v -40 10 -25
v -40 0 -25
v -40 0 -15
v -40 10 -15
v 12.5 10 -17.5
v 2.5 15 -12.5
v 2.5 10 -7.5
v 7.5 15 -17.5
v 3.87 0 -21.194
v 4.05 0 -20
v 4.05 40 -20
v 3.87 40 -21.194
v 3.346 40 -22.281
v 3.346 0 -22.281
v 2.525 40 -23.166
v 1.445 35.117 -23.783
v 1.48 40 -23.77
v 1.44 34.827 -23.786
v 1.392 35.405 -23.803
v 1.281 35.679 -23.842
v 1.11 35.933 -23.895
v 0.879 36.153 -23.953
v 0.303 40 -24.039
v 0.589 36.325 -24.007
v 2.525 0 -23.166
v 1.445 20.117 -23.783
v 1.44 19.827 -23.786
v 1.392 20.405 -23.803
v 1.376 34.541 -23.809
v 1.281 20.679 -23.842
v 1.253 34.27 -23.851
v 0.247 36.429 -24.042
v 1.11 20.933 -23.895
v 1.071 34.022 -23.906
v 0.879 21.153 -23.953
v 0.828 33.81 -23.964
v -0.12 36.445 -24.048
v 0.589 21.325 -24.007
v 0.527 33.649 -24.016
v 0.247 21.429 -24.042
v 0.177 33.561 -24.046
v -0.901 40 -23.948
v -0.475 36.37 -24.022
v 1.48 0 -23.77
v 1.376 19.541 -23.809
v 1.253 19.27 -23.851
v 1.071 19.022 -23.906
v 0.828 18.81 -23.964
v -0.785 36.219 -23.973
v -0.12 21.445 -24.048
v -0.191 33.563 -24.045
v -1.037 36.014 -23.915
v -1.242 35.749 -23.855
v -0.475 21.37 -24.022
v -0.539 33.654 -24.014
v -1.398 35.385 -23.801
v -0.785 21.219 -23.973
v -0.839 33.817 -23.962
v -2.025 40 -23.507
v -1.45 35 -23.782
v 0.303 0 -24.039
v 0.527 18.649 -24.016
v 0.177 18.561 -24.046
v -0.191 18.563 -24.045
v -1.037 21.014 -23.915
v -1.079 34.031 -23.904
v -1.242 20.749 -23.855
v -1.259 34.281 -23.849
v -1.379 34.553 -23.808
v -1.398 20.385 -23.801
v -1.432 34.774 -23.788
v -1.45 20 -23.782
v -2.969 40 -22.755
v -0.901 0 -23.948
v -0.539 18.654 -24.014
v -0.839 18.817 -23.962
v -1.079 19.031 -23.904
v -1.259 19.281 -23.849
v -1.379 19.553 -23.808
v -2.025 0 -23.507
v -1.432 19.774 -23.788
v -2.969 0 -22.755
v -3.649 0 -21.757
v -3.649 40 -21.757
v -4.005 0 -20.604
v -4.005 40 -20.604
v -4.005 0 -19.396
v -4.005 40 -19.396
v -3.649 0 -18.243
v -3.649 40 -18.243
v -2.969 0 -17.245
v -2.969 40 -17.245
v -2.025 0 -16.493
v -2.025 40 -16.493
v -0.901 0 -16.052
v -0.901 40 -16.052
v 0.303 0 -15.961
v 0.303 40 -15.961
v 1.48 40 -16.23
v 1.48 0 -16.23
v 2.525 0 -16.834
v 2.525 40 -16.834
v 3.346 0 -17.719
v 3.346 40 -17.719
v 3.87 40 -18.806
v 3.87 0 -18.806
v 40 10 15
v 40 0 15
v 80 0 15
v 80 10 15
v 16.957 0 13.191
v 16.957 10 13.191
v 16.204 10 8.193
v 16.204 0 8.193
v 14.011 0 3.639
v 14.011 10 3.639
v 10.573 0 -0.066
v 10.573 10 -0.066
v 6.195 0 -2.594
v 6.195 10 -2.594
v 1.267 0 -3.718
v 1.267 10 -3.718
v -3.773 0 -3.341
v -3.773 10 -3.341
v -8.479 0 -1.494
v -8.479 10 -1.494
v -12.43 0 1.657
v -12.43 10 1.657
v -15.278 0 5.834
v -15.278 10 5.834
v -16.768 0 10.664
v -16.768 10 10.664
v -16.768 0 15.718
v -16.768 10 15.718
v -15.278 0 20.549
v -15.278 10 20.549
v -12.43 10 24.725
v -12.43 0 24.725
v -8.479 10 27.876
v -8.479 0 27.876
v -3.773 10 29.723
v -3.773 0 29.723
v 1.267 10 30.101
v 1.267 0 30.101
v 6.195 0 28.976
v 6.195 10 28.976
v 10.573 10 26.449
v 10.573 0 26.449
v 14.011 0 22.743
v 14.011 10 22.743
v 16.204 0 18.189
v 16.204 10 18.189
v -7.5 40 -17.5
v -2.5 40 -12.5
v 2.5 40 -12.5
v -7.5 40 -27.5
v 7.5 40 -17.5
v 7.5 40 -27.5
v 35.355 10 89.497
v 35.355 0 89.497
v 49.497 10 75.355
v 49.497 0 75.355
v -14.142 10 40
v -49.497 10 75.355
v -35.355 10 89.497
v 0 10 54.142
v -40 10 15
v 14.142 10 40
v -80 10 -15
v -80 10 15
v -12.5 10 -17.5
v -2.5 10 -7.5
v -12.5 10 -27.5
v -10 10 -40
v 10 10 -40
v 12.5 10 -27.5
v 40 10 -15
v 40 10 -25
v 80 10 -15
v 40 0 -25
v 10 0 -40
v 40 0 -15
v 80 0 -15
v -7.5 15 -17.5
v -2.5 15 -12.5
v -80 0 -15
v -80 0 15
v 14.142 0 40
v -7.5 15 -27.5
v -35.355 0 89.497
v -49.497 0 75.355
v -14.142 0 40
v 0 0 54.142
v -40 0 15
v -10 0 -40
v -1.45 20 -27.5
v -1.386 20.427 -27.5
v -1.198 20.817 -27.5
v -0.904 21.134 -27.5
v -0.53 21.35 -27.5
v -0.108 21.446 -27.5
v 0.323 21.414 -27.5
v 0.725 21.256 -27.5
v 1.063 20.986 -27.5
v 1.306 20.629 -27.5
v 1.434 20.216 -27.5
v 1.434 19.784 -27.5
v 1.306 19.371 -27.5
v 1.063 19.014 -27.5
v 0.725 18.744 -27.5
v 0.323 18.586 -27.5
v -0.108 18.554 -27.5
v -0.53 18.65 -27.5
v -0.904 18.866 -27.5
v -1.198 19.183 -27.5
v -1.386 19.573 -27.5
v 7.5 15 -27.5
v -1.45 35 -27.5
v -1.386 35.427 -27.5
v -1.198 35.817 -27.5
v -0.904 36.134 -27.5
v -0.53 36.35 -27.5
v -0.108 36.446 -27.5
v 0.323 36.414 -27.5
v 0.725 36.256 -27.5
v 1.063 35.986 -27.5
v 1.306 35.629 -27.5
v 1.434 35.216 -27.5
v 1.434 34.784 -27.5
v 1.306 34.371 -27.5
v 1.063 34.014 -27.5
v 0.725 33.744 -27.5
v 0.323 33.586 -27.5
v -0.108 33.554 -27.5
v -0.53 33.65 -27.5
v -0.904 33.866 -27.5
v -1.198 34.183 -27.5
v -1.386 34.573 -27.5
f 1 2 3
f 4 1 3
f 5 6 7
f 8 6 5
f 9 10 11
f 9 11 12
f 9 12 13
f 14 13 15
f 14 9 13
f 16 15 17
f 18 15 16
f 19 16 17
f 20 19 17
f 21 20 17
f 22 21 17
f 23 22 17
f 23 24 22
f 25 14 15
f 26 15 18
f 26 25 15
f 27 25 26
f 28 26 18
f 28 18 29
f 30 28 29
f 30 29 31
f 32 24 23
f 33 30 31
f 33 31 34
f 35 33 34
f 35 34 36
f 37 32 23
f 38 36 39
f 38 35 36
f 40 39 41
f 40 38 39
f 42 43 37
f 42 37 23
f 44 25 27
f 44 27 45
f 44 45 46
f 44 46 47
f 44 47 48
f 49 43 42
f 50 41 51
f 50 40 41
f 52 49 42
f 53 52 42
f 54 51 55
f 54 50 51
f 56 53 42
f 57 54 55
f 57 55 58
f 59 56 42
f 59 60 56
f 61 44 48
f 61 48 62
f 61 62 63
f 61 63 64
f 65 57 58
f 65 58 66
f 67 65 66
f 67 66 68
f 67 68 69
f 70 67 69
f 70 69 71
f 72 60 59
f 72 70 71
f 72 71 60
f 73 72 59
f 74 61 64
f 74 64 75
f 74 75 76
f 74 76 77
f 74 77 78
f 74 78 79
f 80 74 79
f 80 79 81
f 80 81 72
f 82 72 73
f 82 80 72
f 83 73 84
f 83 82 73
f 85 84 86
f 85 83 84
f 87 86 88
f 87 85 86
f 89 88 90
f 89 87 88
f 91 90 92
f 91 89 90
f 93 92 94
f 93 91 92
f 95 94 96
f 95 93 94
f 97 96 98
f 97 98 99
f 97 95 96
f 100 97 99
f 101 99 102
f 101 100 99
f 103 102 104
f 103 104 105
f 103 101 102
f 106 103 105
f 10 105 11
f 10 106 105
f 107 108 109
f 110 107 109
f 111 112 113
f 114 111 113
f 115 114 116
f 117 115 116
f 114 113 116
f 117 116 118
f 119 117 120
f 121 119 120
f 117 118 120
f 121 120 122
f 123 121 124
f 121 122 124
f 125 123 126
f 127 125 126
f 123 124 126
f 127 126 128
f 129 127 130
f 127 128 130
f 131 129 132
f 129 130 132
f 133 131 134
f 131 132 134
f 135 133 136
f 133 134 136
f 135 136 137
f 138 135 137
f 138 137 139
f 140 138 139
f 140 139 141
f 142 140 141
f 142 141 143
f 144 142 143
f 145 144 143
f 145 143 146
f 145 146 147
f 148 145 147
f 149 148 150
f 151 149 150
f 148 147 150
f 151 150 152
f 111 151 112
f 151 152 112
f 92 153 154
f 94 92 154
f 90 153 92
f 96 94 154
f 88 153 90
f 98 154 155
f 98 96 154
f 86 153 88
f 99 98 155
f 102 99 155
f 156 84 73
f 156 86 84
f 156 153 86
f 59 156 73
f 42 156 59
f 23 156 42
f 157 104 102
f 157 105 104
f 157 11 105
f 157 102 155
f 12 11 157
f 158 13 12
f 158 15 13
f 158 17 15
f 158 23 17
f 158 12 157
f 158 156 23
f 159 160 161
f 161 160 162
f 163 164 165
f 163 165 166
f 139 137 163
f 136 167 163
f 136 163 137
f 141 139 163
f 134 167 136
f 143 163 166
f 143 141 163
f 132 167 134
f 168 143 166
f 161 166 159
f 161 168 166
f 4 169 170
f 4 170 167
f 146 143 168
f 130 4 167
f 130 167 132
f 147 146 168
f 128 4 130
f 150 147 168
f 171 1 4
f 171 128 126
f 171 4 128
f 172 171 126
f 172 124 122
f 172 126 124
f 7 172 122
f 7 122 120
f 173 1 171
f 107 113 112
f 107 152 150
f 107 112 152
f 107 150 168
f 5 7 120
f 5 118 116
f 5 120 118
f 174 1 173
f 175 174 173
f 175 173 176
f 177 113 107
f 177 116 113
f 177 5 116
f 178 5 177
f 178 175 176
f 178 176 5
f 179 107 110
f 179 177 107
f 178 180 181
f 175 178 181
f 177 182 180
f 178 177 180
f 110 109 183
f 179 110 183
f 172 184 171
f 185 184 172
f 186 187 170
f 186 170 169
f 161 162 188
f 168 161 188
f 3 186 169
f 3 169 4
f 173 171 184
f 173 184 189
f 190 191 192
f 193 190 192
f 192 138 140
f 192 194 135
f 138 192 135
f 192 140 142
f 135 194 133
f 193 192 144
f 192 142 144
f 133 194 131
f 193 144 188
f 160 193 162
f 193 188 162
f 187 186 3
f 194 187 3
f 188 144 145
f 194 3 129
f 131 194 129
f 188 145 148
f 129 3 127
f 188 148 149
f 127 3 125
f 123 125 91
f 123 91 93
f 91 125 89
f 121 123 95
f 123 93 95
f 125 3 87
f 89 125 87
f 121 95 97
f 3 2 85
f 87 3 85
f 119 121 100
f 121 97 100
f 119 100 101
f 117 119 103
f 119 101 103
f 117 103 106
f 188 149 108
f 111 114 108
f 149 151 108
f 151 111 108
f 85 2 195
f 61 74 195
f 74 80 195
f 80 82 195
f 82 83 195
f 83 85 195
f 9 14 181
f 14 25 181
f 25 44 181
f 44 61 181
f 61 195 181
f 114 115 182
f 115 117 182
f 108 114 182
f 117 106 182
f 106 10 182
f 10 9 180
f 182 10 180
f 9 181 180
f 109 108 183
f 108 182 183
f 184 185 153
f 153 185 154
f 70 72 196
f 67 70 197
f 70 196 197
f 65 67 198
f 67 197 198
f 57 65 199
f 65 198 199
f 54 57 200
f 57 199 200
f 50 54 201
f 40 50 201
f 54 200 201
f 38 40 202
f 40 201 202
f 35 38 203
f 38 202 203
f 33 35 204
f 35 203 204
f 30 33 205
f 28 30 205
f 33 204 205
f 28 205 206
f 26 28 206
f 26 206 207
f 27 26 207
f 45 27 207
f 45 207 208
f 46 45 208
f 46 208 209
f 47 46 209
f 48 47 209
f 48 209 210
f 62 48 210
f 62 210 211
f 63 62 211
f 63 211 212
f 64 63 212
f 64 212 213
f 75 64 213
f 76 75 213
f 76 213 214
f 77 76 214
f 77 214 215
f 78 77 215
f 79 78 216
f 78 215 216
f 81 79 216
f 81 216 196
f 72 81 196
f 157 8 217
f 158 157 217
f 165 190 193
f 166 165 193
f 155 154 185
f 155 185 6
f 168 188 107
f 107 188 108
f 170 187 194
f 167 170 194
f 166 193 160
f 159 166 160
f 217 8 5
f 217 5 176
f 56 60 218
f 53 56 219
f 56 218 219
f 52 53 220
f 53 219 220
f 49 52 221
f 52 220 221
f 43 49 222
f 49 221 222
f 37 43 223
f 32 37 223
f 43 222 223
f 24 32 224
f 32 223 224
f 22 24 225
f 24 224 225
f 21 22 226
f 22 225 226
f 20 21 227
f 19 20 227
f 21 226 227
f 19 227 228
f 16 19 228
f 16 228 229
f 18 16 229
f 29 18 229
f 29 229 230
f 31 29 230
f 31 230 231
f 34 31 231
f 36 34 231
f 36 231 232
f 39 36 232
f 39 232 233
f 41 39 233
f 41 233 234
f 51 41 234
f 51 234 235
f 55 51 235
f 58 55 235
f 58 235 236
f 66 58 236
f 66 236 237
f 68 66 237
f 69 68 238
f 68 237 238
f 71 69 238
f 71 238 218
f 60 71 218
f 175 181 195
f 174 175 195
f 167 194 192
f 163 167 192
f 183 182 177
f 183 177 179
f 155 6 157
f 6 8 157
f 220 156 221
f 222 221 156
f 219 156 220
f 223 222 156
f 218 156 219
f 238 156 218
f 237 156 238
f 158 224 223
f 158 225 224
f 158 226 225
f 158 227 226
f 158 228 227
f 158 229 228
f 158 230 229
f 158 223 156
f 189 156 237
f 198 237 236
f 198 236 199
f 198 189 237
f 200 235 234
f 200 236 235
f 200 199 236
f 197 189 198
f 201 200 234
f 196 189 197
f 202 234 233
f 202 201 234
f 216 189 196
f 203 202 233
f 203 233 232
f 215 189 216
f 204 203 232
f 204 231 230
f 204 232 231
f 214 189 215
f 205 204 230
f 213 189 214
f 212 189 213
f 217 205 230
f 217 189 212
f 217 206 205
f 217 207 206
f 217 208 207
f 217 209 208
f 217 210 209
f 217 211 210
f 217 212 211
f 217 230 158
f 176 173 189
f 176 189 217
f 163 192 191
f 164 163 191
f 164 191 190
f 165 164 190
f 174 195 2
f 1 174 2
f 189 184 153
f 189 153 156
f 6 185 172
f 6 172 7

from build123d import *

# Parameters (mm, degrees)
SKETCH1_W           = 40
SKETCH1_H           = 30
BOSS_EXTRUDE1_DEPTH = 10
SKETCH2_R           = 4.05
CUT_EXTRUDE1_DEPTH  = 10
SKETCH3_W           = 15
SKETCH3_H           = 15
SKETCH3_R           = 4.05
BOSS_EXTRUDE2_DEPTH = 30
SKETCH4_R           = 1.45
CUT_EXTRUDE2_DEPTH  = 5
CHAMFER1_SIZE       = 5
SKETCH5_R           = 16.957046222
CUT_EXTRUDE3_DEPTH  = 10


with BuildPart() as part:
    # Sketch1 → Boss-Extrude1 (new body)
    with BuildSketch(Plane(origin=(0, 0, 0), x_dir=(1, 0, 0), z_dir=(0, 1, 0))):
        Polygon((14.142135624, -40), (0, -40), (7.071067812, -47.071067812), (0, -54.142135624), (35.355339059, -89.497474683), (49.497474683, -75.355339059), align=None)
        Polygon((7.071067812, -47.071067812), (0, -40), (-7.071067812, -47.071067812), (0, -54.142135624), align=None)
        Polygon((0, -40), (-14.142135624, -40), (-49.497474683, -75.355339059), (-35.355339059, -89.497474683), (0, -54.142135624), (-7.071067812, -47.071067812), align=None)
        Polygon((10, 40), (-10, 40), (-40, 25), (-40, 15), (-40, -15), (-14.142135624, -40), (-7.071067812, -32.928932188), (0, -40), (7.071067812, -32.928932188), (14.142135624, -40), (40, -15), (40, 15), (40, 25), align=None)
        Polygon((7.071067812, -32.928932188), (0, -40), (14.142135624, -40), align=None)
        Polygon((-7.071067812, -32.928932188), (-14.142135624, -40), (0, -40), align=None)
        with Locations((-60, 0)):
            Rectangle(SKETCH1_W, SKETCH1_H)
        with Locations((60, 0)):
            Rectangle(SKETCH1_W, SKETCH1_H)
    extrude(amount=BOSS_EXTRUDE1_DEPTH)

    # Sketch2 → Cut-Extrude1 (cut)
    with BuildSketch(Plane(origin=(0, 10, 0), x_dir=(1, 0, 0), z_dir=(0, 1, 0))):
        with Locations((0, 20)):
            Circle(SKETCH2_R)
    extrude(amount=-CUT_EXTRUDE1_DEPTH, mode=Mode.SUBTRACT)

    # Sketch3 → Boss-Extrude2 (add)
    with BuildSketch(Plane(origin=(0, 10, 0), x_dir=(1, 0, 0), z_dir=(0, 1, 0))):
        with Locations((0, 20)):
            Rectangle(SKETCH3_W, SKETCH3_H)
        with Locations((0, 20)):
            Circle(SKETCH3_R, mode=Mode.SUBTRACT)
    extrude(amount=BOSS_EXTRUDE2_DEPTH)

    # Sketch4 → Cut-Extrude2 (cut)
    with BuildSketch(Plane(origin=(0, 0, -27.5), x_dir=(-1, 0, 0), z_dir=(0, 0, -1))):
        with Locations((0, 35)):
            Circle(SKETCH4_R)
        with Locations((0, 20)):
            Circle(SKETCH4_R)
    extrude(amount=-CUT_EXTRUDE2_DEPTH, mode=Mode.SUBTRACT)

    # Chamfer1
    chamfer1_edges = [part.edges().sort_by_distance(p)[0] for p in [
        (7.5, 10, -20),
        (7.5, 25, -12.5),
        (-7.5, 10, -20),
        (0, 10, -12.5),
        (-7.5, 25, -12.5),
    ]]
    chamfer(chamfer1_edges, length=CHAMFER1_SIZE)

    # Sketch5 → Cut-Extrude3 (cut)
    with BuildSketch(Plane(origin=(0, 10, 0), x_dir=(1, 0, 0), z_dir=(0, 1, 0))):
        with Locations((0, -13.19116881)):
            Circle(SKETCH5_R)
    extrude(amount=-CUT_EXTRUDE3_DEPTH, mode=Mode.SUBTRACT)


solid = part.part
